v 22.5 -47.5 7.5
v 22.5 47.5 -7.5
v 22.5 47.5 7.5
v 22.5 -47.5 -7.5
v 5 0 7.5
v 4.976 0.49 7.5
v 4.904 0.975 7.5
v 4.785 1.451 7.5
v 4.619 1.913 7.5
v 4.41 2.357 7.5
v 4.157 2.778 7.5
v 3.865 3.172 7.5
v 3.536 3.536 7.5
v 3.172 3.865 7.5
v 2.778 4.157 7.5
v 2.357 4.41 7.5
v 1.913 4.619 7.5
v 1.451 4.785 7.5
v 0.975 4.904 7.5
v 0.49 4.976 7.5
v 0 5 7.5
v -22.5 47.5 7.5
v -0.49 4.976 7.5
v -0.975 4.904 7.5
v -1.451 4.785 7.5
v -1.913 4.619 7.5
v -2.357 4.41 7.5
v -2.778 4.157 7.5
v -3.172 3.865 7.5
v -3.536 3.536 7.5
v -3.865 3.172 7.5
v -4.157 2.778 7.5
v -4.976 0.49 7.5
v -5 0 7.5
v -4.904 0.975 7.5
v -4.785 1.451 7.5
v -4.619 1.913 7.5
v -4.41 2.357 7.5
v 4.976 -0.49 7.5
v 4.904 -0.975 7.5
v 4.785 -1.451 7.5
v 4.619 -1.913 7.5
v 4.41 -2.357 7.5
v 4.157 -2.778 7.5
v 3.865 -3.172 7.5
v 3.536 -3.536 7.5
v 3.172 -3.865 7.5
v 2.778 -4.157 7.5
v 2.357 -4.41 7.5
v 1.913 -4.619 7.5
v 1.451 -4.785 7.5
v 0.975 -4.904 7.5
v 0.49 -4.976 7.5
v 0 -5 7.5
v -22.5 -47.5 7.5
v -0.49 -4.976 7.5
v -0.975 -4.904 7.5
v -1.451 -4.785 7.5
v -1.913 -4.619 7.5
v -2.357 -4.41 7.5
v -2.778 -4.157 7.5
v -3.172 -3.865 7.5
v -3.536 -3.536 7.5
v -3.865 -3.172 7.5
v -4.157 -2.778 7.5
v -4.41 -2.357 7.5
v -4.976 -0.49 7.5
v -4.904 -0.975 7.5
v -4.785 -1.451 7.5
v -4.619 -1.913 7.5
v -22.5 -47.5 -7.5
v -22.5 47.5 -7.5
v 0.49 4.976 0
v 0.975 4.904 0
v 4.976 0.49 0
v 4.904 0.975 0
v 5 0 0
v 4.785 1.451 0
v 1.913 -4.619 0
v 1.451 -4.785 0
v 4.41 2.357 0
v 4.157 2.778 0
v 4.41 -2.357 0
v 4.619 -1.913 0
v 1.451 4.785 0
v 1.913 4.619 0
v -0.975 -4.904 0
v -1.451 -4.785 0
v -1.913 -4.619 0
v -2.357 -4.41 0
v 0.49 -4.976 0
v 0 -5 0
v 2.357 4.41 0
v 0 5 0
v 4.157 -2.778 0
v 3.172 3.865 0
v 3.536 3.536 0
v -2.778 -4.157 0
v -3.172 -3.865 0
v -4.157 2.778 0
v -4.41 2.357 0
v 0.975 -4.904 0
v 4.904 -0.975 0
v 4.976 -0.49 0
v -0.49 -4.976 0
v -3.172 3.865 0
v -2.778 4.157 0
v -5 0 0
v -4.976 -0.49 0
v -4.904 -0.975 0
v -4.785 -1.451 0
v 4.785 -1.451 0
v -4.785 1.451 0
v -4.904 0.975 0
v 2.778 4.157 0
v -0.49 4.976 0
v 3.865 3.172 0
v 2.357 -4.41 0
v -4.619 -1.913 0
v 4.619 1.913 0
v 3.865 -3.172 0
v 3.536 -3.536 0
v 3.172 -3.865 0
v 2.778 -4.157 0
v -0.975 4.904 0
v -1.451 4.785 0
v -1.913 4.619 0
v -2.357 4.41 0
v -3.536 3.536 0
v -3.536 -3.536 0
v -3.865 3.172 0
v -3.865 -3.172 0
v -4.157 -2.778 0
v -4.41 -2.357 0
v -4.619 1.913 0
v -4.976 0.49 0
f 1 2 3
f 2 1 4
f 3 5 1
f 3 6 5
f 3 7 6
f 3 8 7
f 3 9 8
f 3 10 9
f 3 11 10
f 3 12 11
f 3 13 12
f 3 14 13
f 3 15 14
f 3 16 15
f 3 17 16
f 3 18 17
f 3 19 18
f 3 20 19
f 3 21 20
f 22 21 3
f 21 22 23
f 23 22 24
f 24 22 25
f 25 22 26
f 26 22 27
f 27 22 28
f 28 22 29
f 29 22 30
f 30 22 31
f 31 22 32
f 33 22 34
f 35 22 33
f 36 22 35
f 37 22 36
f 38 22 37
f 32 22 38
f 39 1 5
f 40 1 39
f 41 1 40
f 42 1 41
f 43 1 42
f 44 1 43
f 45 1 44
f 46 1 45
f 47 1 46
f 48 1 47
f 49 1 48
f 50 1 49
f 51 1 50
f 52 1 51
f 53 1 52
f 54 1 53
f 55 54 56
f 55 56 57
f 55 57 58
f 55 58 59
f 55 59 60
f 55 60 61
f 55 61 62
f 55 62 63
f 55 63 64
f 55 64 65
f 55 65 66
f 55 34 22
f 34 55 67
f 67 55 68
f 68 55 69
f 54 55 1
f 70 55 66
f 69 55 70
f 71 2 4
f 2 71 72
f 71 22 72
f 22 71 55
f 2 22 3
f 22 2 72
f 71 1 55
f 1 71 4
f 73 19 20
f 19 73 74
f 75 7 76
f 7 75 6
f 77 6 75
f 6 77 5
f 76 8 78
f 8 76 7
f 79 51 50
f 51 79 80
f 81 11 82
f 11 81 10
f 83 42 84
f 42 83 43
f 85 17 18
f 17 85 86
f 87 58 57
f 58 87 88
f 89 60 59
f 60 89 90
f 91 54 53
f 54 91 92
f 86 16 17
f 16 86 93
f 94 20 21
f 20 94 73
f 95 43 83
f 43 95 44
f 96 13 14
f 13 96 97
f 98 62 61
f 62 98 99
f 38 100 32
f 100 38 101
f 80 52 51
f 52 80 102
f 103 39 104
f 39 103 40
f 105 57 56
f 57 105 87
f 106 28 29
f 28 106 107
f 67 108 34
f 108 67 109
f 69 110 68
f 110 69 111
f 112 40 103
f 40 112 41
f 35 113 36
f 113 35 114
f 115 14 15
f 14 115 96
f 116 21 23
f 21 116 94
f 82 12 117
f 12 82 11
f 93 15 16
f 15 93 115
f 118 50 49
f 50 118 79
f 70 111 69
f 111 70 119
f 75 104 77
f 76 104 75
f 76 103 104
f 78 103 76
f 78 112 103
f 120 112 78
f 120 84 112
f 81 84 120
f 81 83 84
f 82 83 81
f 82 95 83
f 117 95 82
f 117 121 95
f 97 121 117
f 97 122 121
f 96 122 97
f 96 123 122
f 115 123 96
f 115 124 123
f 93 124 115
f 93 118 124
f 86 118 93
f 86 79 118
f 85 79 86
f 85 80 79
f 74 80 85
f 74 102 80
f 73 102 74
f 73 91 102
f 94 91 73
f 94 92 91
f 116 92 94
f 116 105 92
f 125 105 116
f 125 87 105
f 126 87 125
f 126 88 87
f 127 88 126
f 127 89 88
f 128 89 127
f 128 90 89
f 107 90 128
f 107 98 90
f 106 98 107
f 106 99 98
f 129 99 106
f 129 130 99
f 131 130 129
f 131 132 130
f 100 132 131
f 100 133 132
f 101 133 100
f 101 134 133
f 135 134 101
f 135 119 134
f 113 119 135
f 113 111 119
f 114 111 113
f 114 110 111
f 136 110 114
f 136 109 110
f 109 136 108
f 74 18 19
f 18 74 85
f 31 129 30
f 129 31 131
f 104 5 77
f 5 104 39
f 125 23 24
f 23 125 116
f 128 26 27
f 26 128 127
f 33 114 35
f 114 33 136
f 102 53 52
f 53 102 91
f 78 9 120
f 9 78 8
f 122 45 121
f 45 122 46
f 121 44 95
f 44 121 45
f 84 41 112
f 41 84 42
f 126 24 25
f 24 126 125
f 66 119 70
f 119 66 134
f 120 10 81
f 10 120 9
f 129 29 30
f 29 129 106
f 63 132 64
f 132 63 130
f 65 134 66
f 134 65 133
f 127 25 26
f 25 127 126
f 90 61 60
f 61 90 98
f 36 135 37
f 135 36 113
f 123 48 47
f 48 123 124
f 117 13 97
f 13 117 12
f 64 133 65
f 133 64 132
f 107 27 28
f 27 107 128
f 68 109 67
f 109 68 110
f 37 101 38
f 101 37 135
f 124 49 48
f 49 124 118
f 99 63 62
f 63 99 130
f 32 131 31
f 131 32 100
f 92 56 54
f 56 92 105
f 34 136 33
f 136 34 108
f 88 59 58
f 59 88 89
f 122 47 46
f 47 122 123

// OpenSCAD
 
buggy_width=50;
buggy_length=100;
buggy_height=40;
wall_width=10;
square_height = 5;
lid_height = 2.4;
tut_height = 10;
tut_radius = 4;
hole_depth = 15;
$fn = 64;

module bogie_lid() {
  difference() {
  cube(size=[buggy_width-wall_width+5, buggy_length-wall_width+5, hole_depth], center=true);
      cylinder(h=tut_height+1, r1=tut_radius+1, r2=tut_radius+1);
 }
}

bogie_lid();
